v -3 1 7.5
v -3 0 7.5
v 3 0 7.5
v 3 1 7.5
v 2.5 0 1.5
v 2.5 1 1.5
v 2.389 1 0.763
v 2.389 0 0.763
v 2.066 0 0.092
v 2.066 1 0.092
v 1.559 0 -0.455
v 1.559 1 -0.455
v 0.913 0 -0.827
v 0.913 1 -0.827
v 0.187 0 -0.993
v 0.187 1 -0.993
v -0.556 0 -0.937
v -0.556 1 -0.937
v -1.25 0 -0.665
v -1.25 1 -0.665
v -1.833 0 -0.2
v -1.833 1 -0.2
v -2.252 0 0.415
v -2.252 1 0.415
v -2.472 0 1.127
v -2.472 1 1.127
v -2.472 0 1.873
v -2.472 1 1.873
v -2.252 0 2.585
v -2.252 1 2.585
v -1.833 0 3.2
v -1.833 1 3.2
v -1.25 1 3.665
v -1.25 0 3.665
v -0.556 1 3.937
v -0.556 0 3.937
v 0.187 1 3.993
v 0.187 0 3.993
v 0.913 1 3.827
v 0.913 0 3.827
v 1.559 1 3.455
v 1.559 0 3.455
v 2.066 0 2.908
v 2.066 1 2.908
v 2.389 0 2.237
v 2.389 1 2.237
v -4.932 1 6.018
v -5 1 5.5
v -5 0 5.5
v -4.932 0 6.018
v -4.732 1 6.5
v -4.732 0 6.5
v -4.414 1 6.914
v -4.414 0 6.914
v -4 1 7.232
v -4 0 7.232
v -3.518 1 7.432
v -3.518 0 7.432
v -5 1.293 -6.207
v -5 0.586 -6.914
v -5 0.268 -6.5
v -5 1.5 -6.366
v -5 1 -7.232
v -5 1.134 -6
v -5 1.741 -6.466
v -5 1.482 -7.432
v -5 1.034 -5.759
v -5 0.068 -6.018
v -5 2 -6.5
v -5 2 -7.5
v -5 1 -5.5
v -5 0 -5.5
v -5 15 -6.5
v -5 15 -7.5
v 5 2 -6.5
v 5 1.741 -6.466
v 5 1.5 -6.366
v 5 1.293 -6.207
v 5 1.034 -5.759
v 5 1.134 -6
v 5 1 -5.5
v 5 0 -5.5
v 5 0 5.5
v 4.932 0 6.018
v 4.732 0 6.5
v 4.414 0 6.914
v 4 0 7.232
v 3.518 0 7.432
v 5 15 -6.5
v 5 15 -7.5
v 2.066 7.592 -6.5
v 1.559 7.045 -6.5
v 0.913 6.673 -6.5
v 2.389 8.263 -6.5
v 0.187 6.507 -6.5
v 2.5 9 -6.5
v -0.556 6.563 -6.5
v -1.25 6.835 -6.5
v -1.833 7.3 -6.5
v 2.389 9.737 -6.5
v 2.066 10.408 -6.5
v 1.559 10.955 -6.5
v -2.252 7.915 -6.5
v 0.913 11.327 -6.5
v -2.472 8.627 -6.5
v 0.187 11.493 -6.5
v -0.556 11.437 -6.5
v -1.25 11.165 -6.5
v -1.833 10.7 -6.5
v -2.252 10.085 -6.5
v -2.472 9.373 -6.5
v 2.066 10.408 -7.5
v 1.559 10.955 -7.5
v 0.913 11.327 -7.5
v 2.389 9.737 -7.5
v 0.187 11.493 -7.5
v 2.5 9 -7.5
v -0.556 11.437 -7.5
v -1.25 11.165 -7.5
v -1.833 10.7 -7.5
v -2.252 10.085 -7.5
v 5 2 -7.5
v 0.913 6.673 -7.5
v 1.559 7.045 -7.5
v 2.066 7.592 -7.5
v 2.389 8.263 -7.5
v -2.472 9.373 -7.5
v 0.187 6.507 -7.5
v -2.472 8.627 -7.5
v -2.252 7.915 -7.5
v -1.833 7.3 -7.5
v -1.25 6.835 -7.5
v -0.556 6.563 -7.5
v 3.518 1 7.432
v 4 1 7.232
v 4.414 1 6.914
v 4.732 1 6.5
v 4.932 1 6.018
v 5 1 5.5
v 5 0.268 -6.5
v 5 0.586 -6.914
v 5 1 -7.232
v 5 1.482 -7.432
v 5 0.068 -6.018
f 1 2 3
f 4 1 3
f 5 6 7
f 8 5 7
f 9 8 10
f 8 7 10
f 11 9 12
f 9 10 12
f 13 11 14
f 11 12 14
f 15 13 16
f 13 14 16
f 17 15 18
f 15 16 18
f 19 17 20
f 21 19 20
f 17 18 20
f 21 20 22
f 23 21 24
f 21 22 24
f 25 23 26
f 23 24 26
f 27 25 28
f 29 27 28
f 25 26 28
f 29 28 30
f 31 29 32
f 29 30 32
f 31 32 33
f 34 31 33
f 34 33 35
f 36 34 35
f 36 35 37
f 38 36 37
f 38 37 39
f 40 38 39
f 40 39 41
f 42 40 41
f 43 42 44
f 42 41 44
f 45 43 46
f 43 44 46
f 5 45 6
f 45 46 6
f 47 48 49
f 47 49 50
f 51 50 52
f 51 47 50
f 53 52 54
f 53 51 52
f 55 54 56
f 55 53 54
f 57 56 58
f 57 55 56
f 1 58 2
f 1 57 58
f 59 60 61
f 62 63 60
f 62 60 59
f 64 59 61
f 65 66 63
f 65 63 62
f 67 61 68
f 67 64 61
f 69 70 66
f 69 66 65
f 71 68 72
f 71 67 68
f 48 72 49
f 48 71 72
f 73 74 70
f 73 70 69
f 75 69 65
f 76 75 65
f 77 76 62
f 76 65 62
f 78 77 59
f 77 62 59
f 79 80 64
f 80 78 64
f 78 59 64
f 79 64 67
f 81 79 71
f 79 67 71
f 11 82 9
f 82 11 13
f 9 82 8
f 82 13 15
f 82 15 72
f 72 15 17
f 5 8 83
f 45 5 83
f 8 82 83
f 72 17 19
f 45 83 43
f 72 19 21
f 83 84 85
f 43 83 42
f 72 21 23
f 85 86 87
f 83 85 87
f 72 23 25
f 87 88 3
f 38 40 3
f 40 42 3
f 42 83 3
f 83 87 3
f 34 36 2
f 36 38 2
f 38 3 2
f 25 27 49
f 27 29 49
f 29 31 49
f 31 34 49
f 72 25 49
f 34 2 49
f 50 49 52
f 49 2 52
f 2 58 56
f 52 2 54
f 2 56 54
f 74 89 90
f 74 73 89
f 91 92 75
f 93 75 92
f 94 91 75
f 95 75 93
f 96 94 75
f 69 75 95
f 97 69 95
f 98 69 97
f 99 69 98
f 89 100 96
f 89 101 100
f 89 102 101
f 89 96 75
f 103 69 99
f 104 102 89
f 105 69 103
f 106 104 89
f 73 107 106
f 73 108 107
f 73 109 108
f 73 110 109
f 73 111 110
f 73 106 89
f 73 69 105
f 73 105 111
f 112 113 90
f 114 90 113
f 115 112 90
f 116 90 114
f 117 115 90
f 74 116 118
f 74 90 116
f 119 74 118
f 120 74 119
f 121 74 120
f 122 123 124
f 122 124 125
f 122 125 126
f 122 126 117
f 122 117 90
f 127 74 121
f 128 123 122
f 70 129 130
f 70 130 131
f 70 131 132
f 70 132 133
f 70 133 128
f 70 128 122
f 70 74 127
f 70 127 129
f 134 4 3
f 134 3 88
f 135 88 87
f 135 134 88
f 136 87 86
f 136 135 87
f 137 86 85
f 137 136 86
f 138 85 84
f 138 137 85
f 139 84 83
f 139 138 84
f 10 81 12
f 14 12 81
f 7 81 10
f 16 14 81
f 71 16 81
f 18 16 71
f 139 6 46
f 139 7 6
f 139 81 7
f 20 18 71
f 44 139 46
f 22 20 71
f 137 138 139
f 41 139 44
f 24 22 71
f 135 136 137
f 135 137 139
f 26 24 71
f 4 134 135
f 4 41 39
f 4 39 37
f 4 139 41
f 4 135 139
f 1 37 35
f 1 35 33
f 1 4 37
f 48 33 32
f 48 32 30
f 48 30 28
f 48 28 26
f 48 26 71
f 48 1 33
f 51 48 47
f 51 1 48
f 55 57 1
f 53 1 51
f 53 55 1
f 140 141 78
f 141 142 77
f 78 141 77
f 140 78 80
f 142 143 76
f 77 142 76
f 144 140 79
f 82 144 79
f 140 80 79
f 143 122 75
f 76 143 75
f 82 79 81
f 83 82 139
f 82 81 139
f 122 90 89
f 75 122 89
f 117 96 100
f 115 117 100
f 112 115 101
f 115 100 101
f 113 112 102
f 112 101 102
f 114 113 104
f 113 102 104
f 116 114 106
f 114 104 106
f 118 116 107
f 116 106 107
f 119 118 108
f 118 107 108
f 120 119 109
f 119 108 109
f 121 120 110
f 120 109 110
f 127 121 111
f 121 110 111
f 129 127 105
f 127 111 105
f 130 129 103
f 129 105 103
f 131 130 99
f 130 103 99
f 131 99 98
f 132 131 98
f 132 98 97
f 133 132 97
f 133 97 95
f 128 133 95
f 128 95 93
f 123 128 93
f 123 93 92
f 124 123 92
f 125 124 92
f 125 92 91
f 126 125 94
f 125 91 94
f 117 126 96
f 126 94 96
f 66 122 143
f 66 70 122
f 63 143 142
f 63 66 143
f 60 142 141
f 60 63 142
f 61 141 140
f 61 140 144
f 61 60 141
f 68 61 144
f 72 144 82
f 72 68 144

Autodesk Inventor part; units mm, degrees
ref_plane "YZ Plane" through (0, 0, 0) normal (1, 0, 0) x (0, 1, 0)
ref_plane "XZ Plane" through (0, 0, 0) normal (0, 1, 0) x (-1, 0, 0)
ref_plane "XY Plane" through (0, 0, 0) normal (0, 0, 1) x (1, 0, 0)
sketch "スケッチ9" plane through (0, 0, 0) normal (0, 1, 0) x (-1, 0, 0)
  line L0 (5, 7.5) -> (-5, 7.5)
  line L1 (-5, 7.5) -> (-5, -7.5)
  line L2 (-5, -7.5) -> (5, -7.5)
  line L3 (5, -7.5) -> (5, 7.5)
  line L4 (7, 0) -> (-7, 0)
  line L5 (0, -10.5) -> (0, 10.5)
  point P0 (0, 0)
  point P1 (5, 0)
  point P2 (0, 7.5)
  dimension "d53" = 15
  dimension "d54" = 10
extrude "プレート7" add sketch "スケッチ9" along normal blind 1
sketch "スケッチ10" plane through (-5, 0, -6.5) normal (0, 0, -1) x (-1, 0, 0)
  line L0 (-10, 0) -> (0, 0)
  line L1 (0, 0) -> (0, 15)
  line L2 (0, 15) -> (-10, 15)
  line L3 (-10, 15) -> (-10, 0)
edge flange "フランジ5" height 15 angle 90 thickness 1 bend radius 1 thickness toward (0, 0, -1) relief tear relief width 1 relief depth 0.5 edges at (0, 1, -7.5) wall of the first edge with corners at (5, 0, -6.5) (-5, 0, -6.5) (-5, 15, -6.5) (5, 15, -6.5)
bend "曲げ5"
corner "コーナー5"
sketch "スケッチ11" plane through (-5, 15, -6.5) normal (0, 0, 1) x (1, 0, 0)
  circle A0 centre (5, -6) radius 2.5
  line L0 (10, 0) -> (0, 0) projected
  line L1 (0, 0) -> (0, -13) projected
  point P0 (5, -15)
  dimension "d66" = 5
  dimension "d67" = 6
  dimension "d76" = 5
sketch "スケッチ12" plane through (0, 1, 0) normal (0, 1, 0) x (1, 0, 0)
  circle A0 centre (0, -1.5) radius 2.5
  line L0 (5, -7.5) -> (-5, -7.5) projected
  line L1 (-5, -7.5) -> (-5, 5.5) projected
  line L2 (0, 11.6) -> (0, -13.6) projected
  point P0 (0, 0)
  dimension "d69" = 6
  dimension "d71" = 5
extrude "押し出し3" cut sketch "スケッチ12" against normal up to next
extrude "押し出し4" cut sketch "スケッチ11" against normal up to next
fillet "フィレット2" radius 2 2 edges at (5, 0.5, 7.5) (-5, 0.5, 7.5)
equation "\"d55\" = Thickness"
equation "\"d56\" = BendReliefWidth"
equation "\"d57\" = BendReliefDepth"
equation "\"d58\" = MinimumRemnant"
equation "\"d59\" = TransitionRadius"
equation "\"d62\" = BendRadius"
equation "\"d63\" = CornerReliefSize"
equation "\"d64\" = GapSize"
equation "\"d65\" = JacobiRadiusSize"
equation "\"BendRadius\" = Thickness"
equation "\"BendReliefWidth\" = Thickness"
equation "\"BendReliefDepth\" = 0.5 * Thickness"
equation "\"CornerReliefSize\" = 4 * Thickness"
equation "\"MinimumRemnant\" = 2 * Thickness"
equation "\"TransitionRadius\" = BendRadius"
equation "\"JacobiRadiusSize\" = BendRadius"
equation "\"GapSize\" = Thickness"
equation "\"Thickness\" = 1"
properties part number "element_clip" material "アルミニウム 6061"
